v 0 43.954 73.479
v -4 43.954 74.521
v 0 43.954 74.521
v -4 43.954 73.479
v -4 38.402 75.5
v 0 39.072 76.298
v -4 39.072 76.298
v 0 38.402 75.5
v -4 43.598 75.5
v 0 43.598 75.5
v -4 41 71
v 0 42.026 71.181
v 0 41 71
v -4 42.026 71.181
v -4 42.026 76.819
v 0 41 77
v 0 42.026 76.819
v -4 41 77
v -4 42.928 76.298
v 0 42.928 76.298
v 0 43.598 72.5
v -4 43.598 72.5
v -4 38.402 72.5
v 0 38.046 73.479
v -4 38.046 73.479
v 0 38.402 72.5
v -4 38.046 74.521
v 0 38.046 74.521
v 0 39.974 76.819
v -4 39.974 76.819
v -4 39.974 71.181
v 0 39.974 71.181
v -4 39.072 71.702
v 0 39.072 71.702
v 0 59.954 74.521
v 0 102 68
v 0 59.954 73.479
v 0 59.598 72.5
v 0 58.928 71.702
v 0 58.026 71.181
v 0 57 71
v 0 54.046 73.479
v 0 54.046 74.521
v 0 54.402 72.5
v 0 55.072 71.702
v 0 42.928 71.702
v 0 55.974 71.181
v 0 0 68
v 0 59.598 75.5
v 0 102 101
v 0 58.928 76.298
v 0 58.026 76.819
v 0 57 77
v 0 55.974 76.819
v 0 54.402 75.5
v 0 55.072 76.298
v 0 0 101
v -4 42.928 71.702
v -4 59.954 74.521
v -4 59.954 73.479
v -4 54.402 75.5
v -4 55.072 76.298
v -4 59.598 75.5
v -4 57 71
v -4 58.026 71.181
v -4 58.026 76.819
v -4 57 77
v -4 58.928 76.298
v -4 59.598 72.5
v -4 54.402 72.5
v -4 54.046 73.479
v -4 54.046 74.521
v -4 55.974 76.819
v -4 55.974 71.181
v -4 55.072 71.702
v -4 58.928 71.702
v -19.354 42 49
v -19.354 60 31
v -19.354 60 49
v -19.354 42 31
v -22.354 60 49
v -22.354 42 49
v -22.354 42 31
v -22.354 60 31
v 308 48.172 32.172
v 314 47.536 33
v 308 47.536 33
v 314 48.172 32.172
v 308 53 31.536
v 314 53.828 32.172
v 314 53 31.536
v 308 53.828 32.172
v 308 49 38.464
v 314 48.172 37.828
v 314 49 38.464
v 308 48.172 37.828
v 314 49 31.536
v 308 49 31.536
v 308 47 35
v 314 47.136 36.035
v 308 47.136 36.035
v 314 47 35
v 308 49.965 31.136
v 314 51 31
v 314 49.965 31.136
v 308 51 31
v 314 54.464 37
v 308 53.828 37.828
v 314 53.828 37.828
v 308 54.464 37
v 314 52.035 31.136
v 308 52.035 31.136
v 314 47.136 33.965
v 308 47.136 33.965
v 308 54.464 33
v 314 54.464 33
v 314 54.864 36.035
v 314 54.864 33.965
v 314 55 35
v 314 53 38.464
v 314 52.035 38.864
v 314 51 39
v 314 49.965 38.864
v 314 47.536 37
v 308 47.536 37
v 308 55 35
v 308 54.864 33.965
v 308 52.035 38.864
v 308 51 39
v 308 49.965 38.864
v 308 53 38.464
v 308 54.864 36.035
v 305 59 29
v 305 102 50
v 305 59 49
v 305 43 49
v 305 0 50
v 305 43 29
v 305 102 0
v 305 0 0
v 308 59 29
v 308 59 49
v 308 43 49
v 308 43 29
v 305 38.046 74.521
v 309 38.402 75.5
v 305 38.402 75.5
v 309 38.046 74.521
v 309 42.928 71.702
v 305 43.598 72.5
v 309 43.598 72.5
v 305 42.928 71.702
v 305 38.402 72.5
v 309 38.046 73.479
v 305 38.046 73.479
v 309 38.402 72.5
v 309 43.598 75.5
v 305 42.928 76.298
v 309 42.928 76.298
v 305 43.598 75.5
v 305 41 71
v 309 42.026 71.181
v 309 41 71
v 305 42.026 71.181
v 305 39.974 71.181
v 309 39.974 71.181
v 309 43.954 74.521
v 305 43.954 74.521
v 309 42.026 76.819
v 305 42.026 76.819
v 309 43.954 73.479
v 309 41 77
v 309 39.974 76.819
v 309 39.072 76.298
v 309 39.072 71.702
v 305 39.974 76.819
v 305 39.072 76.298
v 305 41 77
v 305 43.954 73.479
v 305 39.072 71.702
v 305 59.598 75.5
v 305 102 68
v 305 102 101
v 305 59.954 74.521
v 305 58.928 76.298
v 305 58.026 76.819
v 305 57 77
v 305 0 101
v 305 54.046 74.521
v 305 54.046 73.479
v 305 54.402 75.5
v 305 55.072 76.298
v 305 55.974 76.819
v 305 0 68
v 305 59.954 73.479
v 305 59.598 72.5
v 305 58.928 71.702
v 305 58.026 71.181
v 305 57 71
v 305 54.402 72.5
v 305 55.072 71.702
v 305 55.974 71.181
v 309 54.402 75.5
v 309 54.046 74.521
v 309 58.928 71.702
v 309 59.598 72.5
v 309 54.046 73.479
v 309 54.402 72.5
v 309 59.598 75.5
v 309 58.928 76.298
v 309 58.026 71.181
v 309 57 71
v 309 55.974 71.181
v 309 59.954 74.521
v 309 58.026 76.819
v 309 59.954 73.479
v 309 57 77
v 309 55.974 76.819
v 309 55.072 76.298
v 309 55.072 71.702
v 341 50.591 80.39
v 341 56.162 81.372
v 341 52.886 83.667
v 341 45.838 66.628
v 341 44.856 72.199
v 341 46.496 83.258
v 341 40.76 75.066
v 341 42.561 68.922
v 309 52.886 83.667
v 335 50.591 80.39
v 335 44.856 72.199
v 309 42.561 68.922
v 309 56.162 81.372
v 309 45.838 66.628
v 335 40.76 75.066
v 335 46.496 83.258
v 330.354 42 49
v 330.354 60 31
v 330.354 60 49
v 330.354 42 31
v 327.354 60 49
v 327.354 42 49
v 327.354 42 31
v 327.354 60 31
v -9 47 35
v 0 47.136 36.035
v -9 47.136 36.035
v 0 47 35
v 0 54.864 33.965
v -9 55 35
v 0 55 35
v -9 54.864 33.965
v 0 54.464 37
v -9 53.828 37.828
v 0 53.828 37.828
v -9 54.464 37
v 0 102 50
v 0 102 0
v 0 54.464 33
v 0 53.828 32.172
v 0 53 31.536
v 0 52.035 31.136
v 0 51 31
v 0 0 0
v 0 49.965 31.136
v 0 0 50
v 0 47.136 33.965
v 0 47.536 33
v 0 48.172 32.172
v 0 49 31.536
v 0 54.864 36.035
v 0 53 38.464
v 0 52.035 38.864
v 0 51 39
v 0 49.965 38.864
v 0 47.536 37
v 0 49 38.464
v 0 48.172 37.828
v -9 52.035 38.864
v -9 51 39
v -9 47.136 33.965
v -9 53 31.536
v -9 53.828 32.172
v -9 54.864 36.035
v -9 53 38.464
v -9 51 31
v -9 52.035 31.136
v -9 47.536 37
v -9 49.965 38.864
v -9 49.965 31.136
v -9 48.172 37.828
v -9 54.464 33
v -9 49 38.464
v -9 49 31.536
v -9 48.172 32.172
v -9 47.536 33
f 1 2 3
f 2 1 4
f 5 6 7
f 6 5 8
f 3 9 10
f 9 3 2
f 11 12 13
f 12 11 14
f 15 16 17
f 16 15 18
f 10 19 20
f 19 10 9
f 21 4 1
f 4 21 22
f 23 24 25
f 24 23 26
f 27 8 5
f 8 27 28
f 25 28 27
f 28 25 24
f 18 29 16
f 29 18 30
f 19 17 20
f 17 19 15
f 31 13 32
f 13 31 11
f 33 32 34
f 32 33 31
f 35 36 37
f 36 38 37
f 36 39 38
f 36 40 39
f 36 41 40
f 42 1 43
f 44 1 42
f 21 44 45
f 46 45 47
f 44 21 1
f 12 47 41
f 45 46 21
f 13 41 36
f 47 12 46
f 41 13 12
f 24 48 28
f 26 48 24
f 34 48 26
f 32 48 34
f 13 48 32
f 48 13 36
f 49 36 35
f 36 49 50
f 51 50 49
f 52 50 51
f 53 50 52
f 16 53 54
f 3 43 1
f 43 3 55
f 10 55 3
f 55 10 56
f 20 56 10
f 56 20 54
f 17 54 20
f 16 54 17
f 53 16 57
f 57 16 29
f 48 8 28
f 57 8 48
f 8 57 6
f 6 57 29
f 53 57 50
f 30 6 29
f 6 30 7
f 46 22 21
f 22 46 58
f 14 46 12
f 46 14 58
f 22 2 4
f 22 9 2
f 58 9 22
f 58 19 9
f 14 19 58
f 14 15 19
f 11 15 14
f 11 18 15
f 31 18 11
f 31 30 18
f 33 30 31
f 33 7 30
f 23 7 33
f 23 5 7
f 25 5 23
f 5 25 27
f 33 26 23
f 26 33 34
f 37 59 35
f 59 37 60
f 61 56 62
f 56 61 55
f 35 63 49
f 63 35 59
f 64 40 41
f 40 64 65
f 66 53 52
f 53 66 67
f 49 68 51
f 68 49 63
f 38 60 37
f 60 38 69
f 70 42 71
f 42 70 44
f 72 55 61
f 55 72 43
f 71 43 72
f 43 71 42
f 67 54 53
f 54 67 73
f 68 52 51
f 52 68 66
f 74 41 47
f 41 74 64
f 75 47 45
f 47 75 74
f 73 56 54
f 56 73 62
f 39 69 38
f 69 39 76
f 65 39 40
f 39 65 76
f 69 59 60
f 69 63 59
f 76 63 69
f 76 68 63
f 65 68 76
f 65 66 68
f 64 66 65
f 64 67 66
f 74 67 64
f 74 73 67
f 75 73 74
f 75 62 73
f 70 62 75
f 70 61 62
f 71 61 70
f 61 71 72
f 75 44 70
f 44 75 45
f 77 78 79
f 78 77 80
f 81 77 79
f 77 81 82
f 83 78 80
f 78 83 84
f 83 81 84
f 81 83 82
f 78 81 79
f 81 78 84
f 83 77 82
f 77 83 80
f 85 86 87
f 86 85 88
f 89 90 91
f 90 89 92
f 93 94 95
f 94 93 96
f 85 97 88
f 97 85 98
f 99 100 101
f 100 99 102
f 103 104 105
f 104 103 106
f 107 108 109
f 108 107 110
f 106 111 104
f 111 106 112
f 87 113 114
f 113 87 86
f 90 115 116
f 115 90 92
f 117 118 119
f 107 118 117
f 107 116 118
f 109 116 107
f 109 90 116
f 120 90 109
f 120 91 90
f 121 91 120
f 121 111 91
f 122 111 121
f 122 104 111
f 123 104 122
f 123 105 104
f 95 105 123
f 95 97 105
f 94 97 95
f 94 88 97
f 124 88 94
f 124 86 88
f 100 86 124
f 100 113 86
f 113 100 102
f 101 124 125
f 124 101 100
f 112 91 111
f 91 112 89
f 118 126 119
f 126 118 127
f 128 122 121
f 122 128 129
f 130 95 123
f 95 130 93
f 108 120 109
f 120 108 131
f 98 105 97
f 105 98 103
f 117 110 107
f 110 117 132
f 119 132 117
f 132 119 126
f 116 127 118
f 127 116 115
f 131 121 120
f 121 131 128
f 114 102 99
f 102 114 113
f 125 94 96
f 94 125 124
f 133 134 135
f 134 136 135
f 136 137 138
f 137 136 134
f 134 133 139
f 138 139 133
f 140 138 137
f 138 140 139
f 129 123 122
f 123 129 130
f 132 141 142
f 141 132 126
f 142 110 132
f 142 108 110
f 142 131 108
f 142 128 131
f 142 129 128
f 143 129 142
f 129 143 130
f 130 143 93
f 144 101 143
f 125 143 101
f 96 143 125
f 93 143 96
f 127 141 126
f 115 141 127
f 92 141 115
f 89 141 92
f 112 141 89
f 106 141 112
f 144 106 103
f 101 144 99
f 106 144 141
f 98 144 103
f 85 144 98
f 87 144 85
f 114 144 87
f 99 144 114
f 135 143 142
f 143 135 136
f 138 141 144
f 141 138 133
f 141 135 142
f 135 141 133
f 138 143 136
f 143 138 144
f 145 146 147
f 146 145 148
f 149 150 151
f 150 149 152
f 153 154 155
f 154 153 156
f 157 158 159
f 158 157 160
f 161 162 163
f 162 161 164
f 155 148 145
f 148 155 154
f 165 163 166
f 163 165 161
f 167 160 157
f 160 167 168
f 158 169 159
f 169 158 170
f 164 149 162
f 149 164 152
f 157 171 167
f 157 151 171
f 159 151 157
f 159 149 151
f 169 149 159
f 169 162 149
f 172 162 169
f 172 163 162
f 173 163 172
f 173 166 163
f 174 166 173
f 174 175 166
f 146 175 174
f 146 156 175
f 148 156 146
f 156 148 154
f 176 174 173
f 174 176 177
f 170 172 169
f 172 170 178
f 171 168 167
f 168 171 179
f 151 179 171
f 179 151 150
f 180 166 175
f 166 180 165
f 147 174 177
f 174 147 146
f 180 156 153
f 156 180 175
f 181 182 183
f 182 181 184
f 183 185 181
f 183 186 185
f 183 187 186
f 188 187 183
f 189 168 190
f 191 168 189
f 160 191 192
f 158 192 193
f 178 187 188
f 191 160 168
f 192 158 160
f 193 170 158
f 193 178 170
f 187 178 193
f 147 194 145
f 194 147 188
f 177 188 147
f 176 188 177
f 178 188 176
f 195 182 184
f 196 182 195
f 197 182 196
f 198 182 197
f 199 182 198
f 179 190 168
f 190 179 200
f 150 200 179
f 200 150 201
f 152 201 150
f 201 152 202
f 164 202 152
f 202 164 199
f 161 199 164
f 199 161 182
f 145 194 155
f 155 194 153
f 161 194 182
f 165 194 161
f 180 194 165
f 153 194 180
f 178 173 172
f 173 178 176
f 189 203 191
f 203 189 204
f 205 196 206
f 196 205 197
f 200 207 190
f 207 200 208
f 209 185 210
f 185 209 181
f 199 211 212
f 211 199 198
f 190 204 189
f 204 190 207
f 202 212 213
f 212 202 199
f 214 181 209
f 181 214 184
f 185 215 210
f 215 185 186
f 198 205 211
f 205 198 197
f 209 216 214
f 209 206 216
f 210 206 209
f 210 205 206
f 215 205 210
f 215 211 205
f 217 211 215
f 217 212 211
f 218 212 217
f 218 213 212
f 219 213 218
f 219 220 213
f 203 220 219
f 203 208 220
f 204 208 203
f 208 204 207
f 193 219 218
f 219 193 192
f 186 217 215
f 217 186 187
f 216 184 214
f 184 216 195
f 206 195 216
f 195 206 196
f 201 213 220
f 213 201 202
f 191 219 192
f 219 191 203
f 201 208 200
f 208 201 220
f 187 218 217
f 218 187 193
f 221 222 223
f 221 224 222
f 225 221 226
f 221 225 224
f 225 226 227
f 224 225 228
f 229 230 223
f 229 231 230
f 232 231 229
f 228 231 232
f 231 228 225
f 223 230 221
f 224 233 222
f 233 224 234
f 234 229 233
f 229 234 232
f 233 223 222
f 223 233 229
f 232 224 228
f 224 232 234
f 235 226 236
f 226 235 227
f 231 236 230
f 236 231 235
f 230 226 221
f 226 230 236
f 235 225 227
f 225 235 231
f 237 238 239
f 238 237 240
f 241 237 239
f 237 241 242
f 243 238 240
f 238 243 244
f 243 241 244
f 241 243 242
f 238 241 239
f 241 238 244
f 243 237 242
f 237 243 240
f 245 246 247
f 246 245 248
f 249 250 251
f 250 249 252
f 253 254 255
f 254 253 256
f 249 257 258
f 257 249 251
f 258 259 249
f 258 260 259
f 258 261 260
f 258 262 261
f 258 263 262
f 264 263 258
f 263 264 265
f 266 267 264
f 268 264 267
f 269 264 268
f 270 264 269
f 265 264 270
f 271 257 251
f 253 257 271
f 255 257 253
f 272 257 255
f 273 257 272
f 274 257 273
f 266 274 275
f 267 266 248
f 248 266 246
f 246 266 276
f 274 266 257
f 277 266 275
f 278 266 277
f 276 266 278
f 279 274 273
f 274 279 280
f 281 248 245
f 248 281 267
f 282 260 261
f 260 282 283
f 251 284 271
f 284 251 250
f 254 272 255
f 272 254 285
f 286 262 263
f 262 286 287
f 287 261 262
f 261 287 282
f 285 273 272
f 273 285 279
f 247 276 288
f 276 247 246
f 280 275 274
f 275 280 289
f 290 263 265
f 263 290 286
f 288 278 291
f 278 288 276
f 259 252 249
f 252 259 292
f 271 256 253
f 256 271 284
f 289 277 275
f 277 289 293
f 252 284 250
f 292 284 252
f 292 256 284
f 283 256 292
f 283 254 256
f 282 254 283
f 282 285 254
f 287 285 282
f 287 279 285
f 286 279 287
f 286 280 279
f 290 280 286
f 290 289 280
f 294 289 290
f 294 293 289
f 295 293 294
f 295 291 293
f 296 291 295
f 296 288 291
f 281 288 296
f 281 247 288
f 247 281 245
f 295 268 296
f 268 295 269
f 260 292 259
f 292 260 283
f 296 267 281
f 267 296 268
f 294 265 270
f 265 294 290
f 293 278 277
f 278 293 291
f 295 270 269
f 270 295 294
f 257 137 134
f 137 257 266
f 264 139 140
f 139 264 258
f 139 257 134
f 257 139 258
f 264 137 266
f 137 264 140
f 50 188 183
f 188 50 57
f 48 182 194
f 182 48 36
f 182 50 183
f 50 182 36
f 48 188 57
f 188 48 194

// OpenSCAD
// 04_over_center_toggle.scad
// Over-center toggle latch on each SHORT end-wall.
// A pivoting lever on the upper tray pulls a wire bale over-center,
// drawing the trays together and locking mechanically (cannot spring open).
// Engage: hook bale over stud, push lever down past centre → clamps tight.
// Release: lift lever back past centre, unhook bale.

explode = 18; // 0=engaged, 18=exploded

lx = 305; ly = 102; lz_lo = 50; lz_hi = 33;
wall = 3;

color_lo  = [0.35, 0.55, 0.80, 1];
color_hi  = [0.55, 0.78, 0.95, 1];
color_lev = [0.85, 0.25, 0.25, 1];  // lever – red
color_bale= [0.90, 0.65, 0.10, 1];  // bale – amber
color_stud= [0.70, 0.70, 0.70, 1];  // stud – grey

module lower_tray() { color(color_lo) cube([lx, ly, lz_lo]); }
module upper_tray() {
    color(color_hi) translate([0, 0, lz_lo + explode]) cube([lx, ly, lz_hi]);
}

// ── Catch stud on lower tray end face ────────────────────────────────────────
stud_r   = 4;
stud_prot= 9;   // protrusion from end face
stud_z   = lz_lo - 15;  // height up the lower tray

module catch_stud(ex) {
    x_dir = (ex == 0) ? -1 : 1;
    color(color_stud)
    translate([ex, ly/2, stud_z])
        rotate([0, 90 * x_dir, 0])
            cylinder(r = stud_r, h = stud_prot, $fn=24);
    // Stud base pad
    color(color_stud)
    translate([ex + x_dir * 0, ly/2 - 8, stud_z - 6])
        cube([x_dir * 3, 16, stud_r * 2 + 12]);
}

// ── Toggle latch assembly on upper tray end face ──────────────────────────────
lever_l  = 32;
lever_w  = 18;
lever_t  = 4;
bale_w   = 18;   // inner span of bale (Y)
bale_t   = 3;    // bale wire thickness
bale_ht  = 18;   // bale loop height

module toggle_latch(ex) {
    x_dir = (ex == 0) ? -1 : 1;
    uz = lz_lo + explode;

    // Pivot on upper tray end, centred Y, 5 mm above mating face
    piv_z = uz + 6;
    piv_x = ex;

    // Lever angle: slightly past centre when locked, swung open when exploded
    lev_ang = (explode > 0) ? 55 : -8;

    // Pivot bosses (two ears on tray end face)
    for (dy = [-lever_w/2 - 1, lever_w/2 - 3])
    color(color_lev)
    translate([piv_x, ly/2 + dy, piv_z])
        rotate([0, 90 * x_dir, 0])
            cylinder(r = 3, h = 4, $fn=18);

    // Lever body
    color(color_lev)
    translate([piv_x + x_dir * 4, ly/2, piv_z])
    rotate([lev_ang, 0, 0])
    translate([0, -lever_w/2, 0])
    union() {
        cube([x_dir * lever_l, lever_w, lever_t]);
        // Finger grip nub at end
        translate([x_dir * (lever_l - 6), lever_w/2 - 5, lever_t])
            cube([x_dir * 6, 10, 5]);
    }

    // Bale (wire loop) – hangs from lever tip and hooks under stud
    bale_ax = piv_x + x_dir * (4 + lever_l * cos(lev_ang));
    bale_az = piv_z + lever_l * sin(lev_ang * 3.14159/180) * (explode > 0 ? 0.5 : 1.0);

    color(color_bale)
    translate([bale_ax, ly/2 - bale_w/2, stud_z - 4]) {
        cube([bale_t, bale_w, bale_ht]);              // left rail
        translate([0, bale_w - bale_t, 0]) cube([bale_t, bale_t, bale_ht]); // right rail
        cube([bale_t, bale_w, bale_t]);               // bottom (hooks under stud)
        translate([0, 0, bale_ht - bale_t]) cube([bale_t, bale_w, bale_t]); // top bar
    }
}

// ── Assembly ──────────────────────────────────────────────────────────────────
lower_tray();
upper_tray();
for (ex = [0, lx]) {
    catch_stud(ex);
    toggle_latch(ex);
}
